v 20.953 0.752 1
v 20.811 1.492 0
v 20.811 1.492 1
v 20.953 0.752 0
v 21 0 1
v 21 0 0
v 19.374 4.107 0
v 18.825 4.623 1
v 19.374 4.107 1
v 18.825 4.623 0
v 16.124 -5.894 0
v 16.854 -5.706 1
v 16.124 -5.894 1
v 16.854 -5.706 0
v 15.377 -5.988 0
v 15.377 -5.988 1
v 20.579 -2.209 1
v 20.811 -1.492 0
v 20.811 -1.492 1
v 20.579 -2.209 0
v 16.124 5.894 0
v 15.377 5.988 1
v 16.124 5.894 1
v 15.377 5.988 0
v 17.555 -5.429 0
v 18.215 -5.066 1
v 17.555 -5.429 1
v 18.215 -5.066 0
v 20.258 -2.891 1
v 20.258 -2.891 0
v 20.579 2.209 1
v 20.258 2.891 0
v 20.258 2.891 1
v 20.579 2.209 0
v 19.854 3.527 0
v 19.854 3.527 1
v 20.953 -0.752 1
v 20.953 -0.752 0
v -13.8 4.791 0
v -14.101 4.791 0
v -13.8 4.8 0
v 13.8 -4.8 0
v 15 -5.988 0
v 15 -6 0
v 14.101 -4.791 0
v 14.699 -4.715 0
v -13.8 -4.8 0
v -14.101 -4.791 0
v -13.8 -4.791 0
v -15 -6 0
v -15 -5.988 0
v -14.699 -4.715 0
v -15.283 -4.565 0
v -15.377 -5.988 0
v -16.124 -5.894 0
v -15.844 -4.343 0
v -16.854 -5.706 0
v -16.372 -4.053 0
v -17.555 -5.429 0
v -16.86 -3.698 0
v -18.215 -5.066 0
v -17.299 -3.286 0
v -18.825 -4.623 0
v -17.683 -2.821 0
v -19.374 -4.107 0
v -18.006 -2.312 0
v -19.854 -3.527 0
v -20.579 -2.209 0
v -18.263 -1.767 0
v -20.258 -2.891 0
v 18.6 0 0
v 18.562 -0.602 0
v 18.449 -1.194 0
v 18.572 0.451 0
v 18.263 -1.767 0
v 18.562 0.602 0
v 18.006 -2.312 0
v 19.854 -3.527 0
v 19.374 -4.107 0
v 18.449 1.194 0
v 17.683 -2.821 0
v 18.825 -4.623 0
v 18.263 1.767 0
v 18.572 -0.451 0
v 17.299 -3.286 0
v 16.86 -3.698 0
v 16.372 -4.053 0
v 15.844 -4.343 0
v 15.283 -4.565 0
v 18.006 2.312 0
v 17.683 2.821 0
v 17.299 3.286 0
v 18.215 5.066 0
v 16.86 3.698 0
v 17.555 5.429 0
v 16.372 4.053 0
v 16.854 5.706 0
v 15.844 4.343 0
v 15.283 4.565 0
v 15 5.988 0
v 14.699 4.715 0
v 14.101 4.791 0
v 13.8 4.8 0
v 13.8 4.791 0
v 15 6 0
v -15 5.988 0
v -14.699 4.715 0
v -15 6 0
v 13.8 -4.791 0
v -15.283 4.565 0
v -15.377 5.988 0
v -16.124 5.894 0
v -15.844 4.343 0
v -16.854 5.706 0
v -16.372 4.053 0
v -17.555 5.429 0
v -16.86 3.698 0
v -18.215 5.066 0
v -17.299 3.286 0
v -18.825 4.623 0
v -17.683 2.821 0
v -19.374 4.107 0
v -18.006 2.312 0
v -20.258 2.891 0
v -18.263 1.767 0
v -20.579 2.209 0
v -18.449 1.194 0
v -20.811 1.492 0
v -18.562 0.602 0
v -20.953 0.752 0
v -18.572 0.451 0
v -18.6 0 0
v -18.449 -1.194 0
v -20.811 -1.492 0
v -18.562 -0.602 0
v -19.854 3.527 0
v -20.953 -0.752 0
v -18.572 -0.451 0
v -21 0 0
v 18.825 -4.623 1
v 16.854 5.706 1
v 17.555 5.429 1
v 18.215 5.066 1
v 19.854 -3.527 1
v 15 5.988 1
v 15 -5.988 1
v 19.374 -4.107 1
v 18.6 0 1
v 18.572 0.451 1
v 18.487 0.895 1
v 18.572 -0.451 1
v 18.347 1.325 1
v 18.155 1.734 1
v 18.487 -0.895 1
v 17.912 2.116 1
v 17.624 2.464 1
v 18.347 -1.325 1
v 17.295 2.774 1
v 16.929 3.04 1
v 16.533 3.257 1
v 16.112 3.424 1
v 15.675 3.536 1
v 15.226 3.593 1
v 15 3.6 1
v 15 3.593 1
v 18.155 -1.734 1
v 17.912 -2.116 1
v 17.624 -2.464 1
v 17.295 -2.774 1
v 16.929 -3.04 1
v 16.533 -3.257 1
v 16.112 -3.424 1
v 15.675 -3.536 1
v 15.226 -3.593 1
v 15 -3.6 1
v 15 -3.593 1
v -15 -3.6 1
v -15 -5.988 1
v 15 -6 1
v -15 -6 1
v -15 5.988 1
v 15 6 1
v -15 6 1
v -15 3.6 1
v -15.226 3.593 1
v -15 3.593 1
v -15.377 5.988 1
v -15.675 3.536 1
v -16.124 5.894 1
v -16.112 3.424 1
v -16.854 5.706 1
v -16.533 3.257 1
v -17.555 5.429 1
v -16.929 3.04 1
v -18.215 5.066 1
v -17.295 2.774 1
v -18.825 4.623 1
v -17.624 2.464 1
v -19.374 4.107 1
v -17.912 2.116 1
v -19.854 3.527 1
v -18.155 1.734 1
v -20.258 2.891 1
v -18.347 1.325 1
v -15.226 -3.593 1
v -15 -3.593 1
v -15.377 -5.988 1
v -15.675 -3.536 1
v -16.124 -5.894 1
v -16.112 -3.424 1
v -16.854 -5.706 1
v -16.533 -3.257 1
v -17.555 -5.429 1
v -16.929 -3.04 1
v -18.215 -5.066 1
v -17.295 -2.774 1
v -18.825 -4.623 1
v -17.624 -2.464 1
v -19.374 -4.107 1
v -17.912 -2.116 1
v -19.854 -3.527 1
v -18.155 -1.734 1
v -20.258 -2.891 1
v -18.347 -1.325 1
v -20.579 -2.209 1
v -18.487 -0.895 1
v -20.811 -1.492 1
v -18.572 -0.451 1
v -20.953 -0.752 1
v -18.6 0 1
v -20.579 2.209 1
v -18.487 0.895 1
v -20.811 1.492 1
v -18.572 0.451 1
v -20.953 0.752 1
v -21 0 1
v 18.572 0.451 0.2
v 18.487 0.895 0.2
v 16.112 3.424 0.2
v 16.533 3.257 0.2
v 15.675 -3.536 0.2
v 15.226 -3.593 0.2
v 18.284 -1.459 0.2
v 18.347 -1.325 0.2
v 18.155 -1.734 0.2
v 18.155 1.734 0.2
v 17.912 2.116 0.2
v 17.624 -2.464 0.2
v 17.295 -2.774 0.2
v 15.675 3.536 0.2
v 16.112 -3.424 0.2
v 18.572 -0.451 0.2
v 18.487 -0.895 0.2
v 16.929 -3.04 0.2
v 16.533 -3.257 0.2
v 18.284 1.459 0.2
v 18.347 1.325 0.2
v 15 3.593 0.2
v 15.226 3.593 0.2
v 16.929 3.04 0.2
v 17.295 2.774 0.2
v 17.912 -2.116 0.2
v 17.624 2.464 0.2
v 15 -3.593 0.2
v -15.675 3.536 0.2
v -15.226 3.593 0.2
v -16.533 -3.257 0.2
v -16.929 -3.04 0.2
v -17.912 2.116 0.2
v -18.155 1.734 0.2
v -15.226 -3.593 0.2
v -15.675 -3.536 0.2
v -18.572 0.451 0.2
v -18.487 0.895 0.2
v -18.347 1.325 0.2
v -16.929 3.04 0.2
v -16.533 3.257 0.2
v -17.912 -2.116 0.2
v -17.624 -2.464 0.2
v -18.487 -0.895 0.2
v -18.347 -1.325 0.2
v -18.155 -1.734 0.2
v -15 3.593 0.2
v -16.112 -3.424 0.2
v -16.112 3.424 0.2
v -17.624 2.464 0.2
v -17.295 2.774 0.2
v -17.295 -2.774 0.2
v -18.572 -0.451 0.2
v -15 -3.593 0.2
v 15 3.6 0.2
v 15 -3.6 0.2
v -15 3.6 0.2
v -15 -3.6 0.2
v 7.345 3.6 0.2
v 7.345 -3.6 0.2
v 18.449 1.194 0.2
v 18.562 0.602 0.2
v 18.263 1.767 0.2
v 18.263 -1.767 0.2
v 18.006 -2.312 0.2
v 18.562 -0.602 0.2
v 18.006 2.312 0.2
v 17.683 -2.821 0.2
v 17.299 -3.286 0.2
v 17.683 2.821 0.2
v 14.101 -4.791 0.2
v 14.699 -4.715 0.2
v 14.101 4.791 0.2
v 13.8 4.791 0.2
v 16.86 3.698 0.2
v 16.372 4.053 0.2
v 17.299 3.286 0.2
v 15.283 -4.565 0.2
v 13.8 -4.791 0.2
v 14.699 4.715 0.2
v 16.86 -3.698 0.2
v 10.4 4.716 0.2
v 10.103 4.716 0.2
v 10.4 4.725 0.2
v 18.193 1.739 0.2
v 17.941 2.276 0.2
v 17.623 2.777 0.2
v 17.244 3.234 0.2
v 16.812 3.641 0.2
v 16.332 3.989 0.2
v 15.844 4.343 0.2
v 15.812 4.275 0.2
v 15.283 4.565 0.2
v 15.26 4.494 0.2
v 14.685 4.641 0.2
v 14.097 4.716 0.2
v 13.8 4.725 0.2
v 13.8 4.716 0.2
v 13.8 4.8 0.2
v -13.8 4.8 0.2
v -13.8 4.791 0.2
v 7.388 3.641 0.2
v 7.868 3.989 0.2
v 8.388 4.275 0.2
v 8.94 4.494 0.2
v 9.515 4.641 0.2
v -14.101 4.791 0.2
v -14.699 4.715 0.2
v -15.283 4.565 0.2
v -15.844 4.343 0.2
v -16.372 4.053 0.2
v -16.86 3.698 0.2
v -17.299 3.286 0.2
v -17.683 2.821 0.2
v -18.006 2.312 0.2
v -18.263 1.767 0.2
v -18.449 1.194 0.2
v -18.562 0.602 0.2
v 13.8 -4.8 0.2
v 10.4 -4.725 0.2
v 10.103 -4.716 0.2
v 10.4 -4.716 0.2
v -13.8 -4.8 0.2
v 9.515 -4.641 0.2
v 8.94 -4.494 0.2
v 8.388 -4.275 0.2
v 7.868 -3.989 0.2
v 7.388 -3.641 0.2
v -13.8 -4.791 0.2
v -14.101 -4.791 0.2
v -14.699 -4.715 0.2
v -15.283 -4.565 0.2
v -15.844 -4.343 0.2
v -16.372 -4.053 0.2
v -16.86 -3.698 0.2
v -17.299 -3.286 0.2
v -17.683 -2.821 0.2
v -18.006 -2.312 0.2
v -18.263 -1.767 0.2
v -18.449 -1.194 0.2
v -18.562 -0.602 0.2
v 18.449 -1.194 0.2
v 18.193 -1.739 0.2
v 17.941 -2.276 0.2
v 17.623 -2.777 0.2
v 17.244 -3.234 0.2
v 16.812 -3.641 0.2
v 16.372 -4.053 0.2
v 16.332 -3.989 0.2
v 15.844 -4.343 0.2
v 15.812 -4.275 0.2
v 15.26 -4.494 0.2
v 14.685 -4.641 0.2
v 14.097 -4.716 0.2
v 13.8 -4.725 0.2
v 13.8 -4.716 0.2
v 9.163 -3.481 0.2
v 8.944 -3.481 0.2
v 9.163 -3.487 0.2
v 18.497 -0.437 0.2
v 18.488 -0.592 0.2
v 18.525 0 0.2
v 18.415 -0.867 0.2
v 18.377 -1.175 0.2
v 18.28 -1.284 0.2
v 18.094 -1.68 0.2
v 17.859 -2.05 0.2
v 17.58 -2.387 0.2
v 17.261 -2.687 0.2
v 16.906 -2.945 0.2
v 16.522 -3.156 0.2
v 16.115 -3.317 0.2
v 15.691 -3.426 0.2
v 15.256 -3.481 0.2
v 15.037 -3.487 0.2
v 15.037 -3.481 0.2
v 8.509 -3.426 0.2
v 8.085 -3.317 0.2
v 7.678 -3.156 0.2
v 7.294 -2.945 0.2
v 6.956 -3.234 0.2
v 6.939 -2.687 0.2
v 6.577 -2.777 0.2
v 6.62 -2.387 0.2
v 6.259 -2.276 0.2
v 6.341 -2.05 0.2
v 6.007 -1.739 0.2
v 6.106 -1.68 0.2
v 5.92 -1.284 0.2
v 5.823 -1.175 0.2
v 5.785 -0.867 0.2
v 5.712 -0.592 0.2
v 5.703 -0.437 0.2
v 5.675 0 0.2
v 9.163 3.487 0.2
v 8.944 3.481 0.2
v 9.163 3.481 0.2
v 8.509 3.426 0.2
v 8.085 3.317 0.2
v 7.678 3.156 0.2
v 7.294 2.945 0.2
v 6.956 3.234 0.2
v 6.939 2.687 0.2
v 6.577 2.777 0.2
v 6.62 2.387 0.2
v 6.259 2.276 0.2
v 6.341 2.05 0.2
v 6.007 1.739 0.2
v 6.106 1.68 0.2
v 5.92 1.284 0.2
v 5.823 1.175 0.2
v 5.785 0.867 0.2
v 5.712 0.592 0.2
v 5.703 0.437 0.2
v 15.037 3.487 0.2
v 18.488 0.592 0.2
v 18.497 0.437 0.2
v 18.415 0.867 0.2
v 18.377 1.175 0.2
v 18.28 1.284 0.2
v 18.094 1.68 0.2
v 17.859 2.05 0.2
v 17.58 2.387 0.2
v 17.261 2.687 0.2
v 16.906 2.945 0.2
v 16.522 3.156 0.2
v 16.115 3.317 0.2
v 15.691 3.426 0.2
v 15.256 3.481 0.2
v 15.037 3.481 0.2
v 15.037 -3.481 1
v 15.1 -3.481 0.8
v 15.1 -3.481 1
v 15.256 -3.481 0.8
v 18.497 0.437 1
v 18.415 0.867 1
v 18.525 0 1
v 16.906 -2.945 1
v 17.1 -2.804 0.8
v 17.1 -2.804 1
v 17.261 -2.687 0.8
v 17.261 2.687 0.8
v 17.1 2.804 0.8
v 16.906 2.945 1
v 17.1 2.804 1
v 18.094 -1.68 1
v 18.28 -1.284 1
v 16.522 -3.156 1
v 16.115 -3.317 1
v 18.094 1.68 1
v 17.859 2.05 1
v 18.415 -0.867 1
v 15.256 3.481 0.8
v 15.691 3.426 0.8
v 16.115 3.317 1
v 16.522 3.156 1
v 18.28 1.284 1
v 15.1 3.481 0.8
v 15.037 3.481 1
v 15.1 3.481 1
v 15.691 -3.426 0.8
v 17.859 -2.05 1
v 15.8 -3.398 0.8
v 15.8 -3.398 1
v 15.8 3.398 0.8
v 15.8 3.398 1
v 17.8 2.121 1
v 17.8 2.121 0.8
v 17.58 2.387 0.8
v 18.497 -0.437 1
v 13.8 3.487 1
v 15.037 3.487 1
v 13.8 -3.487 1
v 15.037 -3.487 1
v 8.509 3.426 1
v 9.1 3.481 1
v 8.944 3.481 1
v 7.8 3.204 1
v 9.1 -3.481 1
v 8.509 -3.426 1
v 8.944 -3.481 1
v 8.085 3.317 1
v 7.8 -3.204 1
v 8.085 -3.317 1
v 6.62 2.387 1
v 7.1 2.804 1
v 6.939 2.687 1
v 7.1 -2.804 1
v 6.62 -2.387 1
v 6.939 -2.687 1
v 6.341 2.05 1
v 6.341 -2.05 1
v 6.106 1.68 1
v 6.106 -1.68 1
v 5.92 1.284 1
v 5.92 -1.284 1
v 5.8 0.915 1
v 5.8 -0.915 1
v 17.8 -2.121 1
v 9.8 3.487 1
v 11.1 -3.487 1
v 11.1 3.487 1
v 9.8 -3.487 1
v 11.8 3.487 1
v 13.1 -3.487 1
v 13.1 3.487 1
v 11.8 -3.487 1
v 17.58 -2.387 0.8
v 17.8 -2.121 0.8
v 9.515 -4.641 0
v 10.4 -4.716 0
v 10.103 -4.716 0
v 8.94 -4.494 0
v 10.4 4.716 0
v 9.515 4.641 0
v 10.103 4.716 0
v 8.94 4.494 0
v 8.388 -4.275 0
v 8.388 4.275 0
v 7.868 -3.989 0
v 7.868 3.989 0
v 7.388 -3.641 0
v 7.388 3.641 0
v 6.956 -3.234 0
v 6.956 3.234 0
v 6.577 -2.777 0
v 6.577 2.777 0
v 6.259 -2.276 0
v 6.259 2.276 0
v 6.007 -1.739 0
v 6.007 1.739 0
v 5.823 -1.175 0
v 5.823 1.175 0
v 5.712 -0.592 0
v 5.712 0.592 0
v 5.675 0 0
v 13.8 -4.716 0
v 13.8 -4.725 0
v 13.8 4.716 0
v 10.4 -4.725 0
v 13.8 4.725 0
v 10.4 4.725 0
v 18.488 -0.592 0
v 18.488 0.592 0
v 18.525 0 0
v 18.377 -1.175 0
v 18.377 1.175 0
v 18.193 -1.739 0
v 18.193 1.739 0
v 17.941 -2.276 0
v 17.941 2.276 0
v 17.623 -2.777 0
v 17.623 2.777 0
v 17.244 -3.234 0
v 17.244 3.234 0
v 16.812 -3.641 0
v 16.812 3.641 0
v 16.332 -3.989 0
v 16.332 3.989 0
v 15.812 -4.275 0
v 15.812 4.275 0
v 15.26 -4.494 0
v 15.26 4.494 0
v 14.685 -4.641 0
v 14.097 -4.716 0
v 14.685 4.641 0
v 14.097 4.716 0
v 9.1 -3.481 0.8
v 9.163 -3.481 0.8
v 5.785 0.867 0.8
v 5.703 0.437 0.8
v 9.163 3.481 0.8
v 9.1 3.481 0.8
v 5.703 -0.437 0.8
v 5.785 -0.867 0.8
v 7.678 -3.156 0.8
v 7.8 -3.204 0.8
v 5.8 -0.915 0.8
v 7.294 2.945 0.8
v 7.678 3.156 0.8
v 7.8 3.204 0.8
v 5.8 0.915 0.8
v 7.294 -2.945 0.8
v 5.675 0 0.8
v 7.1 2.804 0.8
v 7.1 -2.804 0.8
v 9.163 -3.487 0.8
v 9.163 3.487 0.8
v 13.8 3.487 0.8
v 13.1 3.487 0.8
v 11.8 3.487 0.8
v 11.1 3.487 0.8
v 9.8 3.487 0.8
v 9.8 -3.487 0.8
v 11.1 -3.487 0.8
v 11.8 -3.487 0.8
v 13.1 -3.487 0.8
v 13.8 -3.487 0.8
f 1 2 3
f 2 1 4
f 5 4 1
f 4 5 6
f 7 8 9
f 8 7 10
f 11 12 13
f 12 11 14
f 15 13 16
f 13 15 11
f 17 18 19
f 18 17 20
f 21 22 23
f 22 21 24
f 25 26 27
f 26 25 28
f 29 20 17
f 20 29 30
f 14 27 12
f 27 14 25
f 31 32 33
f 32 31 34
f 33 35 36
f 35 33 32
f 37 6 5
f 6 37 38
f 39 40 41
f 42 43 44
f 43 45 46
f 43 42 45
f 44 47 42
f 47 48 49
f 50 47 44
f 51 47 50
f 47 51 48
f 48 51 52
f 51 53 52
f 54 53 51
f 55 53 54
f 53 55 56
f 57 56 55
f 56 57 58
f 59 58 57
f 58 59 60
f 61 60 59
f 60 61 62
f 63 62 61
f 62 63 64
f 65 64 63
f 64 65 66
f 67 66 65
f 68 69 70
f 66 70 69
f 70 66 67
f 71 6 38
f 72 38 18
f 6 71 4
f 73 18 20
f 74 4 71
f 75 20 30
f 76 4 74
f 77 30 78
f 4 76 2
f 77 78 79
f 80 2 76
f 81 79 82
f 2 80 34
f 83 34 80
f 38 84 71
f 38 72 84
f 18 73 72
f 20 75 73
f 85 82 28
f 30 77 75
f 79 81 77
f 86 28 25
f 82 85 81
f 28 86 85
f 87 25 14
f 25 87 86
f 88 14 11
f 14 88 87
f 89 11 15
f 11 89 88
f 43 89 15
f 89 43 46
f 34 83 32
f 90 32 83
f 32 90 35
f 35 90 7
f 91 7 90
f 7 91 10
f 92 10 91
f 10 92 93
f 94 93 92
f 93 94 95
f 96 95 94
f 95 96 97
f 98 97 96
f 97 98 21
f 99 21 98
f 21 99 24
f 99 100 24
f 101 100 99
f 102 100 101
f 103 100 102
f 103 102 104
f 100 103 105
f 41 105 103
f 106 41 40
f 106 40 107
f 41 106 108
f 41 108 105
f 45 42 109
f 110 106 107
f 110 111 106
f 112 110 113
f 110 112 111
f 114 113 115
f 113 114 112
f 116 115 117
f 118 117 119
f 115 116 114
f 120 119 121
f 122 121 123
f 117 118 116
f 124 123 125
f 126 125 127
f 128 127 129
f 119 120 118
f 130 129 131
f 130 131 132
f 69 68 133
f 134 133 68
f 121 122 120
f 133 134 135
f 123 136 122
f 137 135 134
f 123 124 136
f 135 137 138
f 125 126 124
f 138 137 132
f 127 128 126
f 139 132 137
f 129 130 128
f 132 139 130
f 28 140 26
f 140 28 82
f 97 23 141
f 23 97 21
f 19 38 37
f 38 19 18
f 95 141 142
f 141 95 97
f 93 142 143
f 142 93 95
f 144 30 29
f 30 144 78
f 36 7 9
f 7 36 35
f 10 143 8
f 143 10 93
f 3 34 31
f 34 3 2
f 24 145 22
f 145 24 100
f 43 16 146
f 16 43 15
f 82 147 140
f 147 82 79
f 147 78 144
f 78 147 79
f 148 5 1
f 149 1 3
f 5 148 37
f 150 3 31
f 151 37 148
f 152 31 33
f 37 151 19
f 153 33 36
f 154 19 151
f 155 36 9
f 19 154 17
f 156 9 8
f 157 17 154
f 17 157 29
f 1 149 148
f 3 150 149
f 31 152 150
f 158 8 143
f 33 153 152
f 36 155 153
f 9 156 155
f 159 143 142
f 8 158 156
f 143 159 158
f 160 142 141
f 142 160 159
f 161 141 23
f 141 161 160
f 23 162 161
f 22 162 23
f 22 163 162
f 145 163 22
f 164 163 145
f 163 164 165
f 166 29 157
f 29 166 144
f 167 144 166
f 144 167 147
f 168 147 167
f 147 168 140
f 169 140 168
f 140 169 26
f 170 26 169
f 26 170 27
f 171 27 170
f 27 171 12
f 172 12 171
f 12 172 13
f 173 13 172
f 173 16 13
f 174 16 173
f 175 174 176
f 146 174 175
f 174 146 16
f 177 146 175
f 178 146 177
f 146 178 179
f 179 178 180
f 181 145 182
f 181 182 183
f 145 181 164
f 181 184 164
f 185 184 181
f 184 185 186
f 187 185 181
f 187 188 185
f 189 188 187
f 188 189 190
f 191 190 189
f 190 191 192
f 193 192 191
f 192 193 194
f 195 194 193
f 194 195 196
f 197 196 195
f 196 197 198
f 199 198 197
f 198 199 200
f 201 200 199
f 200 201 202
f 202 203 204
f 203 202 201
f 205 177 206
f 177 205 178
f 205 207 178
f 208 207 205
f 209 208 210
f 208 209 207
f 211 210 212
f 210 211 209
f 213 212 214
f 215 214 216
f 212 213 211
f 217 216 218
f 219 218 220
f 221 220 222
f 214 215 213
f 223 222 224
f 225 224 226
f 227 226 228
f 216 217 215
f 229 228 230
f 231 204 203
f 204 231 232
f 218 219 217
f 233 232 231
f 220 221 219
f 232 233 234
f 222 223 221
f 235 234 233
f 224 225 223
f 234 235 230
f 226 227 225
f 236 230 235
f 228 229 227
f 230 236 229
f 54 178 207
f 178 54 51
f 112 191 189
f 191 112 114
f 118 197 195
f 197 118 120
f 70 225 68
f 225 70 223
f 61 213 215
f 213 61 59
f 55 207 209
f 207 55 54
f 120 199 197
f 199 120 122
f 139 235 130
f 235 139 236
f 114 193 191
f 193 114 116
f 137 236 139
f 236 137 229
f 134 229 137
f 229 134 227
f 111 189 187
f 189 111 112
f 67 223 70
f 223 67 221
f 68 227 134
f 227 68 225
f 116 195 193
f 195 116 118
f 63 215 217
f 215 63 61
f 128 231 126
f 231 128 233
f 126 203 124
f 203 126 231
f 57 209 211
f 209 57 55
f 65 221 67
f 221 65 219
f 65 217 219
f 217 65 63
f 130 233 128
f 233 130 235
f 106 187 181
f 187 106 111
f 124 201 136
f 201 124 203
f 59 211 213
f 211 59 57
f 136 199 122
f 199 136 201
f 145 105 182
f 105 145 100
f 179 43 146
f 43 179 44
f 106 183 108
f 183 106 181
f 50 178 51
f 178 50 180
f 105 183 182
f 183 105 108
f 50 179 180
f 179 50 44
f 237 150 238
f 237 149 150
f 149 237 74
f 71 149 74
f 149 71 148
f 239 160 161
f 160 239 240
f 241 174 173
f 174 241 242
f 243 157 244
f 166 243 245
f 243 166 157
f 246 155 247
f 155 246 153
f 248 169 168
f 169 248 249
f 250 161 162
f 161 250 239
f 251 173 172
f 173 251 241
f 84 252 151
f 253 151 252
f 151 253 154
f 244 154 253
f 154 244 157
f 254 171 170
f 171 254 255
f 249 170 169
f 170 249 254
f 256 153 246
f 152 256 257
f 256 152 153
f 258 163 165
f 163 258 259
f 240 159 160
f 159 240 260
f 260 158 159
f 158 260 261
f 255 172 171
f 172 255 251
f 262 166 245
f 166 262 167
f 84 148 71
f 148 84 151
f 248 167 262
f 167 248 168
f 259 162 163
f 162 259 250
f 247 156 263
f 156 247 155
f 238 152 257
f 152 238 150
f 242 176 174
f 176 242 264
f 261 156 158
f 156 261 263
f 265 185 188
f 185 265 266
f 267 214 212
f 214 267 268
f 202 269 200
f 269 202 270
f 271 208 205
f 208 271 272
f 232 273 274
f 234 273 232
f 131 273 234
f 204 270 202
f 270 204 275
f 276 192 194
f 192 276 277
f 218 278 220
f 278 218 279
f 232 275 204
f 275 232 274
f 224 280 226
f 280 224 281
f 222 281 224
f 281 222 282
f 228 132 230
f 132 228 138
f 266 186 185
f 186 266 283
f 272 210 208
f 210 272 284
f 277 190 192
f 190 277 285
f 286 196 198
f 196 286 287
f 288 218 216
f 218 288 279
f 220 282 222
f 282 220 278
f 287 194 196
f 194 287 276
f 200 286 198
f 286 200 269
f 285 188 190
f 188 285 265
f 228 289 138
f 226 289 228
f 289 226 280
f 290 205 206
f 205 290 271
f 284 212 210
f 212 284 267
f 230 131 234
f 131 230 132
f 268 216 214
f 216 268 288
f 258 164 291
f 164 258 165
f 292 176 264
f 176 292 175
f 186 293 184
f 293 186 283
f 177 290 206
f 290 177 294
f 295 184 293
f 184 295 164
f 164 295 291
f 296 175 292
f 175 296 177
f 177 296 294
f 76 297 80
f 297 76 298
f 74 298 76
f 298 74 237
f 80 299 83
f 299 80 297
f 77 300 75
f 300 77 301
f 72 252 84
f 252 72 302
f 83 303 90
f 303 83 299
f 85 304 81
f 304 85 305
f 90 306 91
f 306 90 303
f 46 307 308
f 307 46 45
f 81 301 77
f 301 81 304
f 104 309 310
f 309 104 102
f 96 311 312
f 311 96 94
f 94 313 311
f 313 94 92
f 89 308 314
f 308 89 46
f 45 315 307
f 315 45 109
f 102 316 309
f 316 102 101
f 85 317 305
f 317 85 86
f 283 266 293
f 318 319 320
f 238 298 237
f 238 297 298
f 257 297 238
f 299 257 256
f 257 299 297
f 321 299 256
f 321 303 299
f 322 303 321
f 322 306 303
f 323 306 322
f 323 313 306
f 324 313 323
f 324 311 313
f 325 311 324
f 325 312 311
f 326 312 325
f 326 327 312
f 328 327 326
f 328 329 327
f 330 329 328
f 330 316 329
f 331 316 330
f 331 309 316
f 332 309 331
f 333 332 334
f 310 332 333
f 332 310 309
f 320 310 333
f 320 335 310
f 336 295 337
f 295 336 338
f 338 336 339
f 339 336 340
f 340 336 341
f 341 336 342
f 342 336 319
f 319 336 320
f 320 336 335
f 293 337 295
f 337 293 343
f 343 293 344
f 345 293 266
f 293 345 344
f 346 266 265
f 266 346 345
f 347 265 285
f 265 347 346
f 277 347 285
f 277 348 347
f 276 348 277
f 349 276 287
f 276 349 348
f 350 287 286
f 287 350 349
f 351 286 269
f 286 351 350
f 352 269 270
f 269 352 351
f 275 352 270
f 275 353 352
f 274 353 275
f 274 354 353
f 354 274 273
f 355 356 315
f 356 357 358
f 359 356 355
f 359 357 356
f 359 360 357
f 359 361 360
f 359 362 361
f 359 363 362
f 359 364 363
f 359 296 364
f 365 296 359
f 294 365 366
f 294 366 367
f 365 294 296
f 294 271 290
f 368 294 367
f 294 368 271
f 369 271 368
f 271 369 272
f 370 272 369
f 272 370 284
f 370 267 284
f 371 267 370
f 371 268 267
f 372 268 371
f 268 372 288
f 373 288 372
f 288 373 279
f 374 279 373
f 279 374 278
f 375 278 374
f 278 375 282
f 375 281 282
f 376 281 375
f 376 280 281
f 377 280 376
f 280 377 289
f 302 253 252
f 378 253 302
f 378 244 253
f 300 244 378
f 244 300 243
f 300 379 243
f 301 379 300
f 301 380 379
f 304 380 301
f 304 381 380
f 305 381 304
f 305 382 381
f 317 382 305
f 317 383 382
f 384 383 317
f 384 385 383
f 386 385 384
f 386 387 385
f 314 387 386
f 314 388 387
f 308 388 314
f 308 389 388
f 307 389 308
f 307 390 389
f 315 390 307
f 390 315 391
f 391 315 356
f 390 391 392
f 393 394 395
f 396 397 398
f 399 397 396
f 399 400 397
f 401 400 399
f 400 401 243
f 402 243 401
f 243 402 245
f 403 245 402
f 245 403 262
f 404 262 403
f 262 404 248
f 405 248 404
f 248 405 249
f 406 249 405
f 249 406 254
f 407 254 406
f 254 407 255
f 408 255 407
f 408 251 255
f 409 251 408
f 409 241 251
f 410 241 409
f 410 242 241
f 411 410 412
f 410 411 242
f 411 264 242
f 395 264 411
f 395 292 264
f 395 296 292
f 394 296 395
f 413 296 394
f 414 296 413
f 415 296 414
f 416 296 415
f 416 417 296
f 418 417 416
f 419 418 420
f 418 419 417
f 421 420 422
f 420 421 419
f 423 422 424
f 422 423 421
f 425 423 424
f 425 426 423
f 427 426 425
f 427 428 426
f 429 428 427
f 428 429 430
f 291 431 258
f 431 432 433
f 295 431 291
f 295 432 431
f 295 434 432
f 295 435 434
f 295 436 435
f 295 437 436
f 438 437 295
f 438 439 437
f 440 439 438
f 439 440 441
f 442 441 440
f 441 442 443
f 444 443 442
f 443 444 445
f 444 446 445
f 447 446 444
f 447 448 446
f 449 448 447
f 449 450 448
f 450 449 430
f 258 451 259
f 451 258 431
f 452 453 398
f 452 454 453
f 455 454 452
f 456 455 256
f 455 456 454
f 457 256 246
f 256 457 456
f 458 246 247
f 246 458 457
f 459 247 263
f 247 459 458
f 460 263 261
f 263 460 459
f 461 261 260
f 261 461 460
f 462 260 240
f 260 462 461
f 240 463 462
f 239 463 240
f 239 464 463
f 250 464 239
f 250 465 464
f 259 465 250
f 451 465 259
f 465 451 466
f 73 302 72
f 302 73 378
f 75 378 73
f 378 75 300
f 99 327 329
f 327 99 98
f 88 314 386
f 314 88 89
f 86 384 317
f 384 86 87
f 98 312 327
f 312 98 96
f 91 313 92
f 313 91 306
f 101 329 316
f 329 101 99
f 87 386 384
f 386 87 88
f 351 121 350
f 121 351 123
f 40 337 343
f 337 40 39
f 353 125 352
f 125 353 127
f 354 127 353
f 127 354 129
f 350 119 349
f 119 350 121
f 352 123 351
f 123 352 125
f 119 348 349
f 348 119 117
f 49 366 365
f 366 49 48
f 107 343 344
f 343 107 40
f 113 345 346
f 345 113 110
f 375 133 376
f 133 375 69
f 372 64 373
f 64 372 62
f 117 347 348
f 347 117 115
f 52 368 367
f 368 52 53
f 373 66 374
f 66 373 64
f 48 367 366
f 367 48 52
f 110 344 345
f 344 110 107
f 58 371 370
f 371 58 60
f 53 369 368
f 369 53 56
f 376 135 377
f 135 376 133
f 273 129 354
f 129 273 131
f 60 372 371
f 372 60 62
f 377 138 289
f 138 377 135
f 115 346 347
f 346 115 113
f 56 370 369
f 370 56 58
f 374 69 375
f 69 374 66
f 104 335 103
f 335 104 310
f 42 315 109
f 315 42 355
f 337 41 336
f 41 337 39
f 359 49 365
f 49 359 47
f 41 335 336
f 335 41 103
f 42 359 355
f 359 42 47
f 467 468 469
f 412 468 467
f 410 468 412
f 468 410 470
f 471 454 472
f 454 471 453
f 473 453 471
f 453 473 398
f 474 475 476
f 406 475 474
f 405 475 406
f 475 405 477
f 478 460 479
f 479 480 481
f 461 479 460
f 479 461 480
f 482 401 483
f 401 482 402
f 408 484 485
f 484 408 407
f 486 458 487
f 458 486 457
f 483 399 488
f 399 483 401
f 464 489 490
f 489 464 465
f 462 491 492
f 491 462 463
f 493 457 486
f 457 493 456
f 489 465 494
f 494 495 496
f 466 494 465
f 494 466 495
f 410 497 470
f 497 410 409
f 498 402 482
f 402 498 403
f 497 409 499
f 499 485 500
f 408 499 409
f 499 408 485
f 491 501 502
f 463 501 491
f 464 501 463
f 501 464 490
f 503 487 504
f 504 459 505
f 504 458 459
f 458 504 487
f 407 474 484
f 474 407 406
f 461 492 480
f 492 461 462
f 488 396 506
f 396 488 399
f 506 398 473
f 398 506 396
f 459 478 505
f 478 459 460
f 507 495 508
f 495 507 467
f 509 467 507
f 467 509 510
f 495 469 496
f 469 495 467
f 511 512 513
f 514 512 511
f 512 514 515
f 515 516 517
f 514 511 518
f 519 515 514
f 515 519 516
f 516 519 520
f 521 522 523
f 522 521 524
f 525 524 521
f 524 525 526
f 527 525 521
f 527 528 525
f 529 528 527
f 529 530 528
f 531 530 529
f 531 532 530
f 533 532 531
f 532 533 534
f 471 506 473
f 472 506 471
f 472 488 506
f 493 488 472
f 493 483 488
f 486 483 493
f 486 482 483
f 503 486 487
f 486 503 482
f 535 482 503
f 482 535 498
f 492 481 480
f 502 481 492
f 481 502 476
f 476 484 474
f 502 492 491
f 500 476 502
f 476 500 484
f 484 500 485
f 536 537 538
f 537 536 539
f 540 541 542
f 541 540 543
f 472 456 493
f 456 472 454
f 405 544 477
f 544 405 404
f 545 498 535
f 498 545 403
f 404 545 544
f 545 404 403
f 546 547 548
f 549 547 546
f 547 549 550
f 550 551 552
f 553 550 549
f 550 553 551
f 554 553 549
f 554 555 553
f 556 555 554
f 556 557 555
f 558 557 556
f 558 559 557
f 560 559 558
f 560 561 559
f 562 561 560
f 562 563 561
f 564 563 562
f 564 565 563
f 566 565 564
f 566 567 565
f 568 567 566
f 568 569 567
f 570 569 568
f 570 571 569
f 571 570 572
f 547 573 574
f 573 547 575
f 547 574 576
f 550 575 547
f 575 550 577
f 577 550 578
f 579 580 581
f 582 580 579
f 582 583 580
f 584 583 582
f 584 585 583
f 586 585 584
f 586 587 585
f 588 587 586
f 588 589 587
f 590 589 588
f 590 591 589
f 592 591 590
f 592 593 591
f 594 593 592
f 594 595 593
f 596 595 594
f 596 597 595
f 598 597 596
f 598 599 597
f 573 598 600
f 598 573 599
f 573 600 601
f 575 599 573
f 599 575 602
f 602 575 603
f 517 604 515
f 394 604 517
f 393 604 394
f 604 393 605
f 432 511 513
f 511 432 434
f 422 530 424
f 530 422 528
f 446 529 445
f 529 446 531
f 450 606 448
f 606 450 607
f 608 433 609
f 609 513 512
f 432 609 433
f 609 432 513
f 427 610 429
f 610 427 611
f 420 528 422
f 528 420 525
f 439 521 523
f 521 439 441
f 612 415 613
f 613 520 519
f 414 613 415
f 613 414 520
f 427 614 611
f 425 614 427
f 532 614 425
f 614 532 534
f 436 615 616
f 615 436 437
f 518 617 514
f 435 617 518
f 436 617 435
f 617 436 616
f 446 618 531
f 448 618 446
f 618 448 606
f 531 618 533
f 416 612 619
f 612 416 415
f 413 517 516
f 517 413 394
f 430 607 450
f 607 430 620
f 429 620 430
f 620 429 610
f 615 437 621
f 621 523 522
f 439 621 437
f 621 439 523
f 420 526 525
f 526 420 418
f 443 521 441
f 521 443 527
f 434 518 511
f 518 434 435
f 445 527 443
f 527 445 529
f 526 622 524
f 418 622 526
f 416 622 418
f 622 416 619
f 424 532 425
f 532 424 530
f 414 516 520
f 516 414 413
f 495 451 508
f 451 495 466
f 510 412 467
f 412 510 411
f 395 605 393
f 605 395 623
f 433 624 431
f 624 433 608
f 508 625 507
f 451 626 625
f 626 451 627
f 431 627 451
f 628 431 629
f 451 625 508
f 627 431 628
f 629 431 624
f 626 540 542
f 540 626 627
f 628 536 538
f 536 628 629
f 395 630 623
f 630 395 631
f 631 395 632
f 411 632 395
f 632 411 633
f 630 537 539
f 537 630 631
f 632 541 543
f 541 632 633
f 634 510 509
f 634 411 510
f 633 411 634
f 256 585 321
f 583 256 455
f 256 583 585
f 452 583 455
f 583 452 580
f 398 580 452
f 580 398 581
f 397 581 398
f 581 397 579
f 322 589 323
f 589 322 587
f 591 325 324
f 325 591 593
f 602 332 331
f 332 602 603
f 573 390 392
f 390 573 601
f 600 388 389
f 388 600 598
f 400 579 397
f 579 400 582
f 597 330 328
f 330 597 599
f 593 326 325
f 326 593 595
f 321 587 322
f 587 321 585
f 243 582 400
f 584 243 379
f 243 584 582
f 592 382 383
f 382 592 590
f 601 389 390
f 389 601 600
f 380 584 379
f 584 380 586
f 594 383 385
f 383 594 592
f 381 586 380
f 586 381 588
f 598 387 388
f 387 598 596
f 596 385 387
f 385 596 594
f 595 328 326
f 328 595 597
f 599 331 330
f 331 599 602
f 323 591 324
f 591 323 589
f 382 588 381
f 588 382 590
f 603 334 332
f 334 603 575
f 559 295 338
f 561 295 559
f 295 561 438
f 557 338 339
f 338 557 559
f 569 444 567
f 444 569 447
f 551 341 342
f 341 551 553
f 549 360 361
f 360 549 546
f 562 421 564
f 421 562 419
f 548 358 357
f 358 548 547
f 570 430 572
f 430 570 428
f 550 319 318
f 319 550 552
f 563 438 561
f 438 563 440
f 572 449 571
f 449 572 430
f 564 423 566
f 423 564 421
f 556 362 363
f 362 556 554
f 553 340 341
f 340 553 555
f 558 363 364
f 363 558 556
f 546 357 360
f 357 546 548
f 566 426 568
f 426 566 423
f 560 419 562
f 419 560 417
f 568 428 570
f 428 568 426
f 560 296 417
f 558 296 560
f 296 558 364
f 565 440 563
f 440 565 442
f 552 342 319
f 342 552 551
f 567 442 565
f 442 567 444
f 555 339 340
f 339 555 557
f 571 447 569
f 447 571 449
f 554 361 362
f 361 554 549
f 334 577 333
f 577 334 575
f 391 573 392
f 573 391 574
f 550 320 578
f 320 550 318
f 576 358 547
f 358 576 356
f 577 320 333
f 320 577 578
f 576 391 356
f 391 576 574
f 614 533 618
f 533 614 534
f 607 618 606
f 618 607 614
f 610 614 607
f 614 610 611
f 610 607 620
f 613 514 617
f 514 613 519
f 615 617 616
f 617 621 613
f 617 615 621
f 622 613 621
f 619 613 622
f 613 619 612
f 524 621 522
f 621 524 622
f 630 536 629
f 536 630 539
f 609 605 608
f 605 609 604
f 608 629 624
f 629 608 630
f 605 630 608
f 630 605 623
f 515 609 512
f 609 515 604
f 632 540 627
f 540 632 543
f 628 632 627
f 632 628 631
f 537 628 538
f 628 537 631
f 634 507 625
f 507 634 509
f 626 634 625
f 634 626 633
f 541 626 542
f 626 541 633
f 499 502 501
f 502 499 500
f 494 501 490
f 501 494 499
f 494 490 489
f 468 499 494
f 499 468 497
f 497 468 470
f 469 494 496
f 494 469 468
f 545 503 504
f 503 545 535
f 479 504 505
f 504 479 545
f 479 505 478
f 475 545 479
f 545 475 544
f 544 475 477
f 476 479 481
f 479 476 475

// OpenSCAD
/* Webcam Cover generator v1.0
 * By: Kleinjoni aka. sneezegray
 *
 * - change the values like you want 
 * - render(F6)
 * - look if everything fits, maybe change values again 
 * - change print=true 
 * - export .stl file
 * 
 */
/////////// Settings /////////////
//////////////////////////////////
// print=true putts the parts in printable position 
print=false;
// the outer dimmensions
widht=42;
hight=12;
thickness=1;
// the border width
border=2.4; 
// the width of the webcam cover
camW=13; 
// Design Options
cubic=false;
// stripe widht( 0 if not wanted)
stripes=0.7; 
// how facet rich it should be
$fn=50; 
// spacing Options
// upper gap
gap1=0.15; 
// middel spacing Gap(mostly not necessary)
gap2=0; 
// under gap
gap3=0.15;
// The size difference of the overlapping parts (in Procent) .
under=20; 
//////////////////////////////////
//////////////////////////////////
diff=under/100;

echo("<b>overlapping downpart thickness:", thickness*diff ,"</b>");
echo("<b>overlapping uperpart thickness:", thickness-thickness*diff-gap2 ,"</b>");
echo("<b>webcam hight :", hight-border*2 ,"</b>");

module rcube(w,h,t,cu) {
union(){
if(cu==false){
w=w-h;
translate([w/2,0,0]) {cylinder(t,h/2,h/2);}
translate([-w/2,0,0]) {cylinder(t,h/2,h/2);}
translate([-w/2,-h/2,0]) {cube([w,h,t]);}
}
if(cu==true){
translate([-w/2,-h/2,0]) {cube([w,h,t]);}
}
}
}
if(print==true){
translate([0,hight,thickness])rotate([180,0,0])
oval();
}
if(print==false){
oval();
}
module oval(){
difference(){
rcube(widht,hight,thickness,cubic);
    union(){
rcube((widht-border*2),(hight-border*2),(thickness),cubic);
rcube((widht-border*2),(hight-border),(thickness*diff+gap2),cubic);
    }
}
}

module linear_array( count, distance ) {
    for ( i= [1:1:count])  {
        translate([distance*i,0,0,]) 
        children();
    }
}

translate([widht/2-border-camW/2,0,0]) {
difference(){
union(){
rcube((camW-gap1),(hight-border*2-gap1*1.5),(thickness),cubic);
rcube((camW-gap3),(hight-border-gap3),(thickness*diff),cubic);
}
translate([-camW/2-(hight+border)/2+stripes,-hight/2,thickness*((diff-1)*-1)]) 
linear_array( count=30, distance=2)  cube([stripes,hight+border,1]);

}
}
